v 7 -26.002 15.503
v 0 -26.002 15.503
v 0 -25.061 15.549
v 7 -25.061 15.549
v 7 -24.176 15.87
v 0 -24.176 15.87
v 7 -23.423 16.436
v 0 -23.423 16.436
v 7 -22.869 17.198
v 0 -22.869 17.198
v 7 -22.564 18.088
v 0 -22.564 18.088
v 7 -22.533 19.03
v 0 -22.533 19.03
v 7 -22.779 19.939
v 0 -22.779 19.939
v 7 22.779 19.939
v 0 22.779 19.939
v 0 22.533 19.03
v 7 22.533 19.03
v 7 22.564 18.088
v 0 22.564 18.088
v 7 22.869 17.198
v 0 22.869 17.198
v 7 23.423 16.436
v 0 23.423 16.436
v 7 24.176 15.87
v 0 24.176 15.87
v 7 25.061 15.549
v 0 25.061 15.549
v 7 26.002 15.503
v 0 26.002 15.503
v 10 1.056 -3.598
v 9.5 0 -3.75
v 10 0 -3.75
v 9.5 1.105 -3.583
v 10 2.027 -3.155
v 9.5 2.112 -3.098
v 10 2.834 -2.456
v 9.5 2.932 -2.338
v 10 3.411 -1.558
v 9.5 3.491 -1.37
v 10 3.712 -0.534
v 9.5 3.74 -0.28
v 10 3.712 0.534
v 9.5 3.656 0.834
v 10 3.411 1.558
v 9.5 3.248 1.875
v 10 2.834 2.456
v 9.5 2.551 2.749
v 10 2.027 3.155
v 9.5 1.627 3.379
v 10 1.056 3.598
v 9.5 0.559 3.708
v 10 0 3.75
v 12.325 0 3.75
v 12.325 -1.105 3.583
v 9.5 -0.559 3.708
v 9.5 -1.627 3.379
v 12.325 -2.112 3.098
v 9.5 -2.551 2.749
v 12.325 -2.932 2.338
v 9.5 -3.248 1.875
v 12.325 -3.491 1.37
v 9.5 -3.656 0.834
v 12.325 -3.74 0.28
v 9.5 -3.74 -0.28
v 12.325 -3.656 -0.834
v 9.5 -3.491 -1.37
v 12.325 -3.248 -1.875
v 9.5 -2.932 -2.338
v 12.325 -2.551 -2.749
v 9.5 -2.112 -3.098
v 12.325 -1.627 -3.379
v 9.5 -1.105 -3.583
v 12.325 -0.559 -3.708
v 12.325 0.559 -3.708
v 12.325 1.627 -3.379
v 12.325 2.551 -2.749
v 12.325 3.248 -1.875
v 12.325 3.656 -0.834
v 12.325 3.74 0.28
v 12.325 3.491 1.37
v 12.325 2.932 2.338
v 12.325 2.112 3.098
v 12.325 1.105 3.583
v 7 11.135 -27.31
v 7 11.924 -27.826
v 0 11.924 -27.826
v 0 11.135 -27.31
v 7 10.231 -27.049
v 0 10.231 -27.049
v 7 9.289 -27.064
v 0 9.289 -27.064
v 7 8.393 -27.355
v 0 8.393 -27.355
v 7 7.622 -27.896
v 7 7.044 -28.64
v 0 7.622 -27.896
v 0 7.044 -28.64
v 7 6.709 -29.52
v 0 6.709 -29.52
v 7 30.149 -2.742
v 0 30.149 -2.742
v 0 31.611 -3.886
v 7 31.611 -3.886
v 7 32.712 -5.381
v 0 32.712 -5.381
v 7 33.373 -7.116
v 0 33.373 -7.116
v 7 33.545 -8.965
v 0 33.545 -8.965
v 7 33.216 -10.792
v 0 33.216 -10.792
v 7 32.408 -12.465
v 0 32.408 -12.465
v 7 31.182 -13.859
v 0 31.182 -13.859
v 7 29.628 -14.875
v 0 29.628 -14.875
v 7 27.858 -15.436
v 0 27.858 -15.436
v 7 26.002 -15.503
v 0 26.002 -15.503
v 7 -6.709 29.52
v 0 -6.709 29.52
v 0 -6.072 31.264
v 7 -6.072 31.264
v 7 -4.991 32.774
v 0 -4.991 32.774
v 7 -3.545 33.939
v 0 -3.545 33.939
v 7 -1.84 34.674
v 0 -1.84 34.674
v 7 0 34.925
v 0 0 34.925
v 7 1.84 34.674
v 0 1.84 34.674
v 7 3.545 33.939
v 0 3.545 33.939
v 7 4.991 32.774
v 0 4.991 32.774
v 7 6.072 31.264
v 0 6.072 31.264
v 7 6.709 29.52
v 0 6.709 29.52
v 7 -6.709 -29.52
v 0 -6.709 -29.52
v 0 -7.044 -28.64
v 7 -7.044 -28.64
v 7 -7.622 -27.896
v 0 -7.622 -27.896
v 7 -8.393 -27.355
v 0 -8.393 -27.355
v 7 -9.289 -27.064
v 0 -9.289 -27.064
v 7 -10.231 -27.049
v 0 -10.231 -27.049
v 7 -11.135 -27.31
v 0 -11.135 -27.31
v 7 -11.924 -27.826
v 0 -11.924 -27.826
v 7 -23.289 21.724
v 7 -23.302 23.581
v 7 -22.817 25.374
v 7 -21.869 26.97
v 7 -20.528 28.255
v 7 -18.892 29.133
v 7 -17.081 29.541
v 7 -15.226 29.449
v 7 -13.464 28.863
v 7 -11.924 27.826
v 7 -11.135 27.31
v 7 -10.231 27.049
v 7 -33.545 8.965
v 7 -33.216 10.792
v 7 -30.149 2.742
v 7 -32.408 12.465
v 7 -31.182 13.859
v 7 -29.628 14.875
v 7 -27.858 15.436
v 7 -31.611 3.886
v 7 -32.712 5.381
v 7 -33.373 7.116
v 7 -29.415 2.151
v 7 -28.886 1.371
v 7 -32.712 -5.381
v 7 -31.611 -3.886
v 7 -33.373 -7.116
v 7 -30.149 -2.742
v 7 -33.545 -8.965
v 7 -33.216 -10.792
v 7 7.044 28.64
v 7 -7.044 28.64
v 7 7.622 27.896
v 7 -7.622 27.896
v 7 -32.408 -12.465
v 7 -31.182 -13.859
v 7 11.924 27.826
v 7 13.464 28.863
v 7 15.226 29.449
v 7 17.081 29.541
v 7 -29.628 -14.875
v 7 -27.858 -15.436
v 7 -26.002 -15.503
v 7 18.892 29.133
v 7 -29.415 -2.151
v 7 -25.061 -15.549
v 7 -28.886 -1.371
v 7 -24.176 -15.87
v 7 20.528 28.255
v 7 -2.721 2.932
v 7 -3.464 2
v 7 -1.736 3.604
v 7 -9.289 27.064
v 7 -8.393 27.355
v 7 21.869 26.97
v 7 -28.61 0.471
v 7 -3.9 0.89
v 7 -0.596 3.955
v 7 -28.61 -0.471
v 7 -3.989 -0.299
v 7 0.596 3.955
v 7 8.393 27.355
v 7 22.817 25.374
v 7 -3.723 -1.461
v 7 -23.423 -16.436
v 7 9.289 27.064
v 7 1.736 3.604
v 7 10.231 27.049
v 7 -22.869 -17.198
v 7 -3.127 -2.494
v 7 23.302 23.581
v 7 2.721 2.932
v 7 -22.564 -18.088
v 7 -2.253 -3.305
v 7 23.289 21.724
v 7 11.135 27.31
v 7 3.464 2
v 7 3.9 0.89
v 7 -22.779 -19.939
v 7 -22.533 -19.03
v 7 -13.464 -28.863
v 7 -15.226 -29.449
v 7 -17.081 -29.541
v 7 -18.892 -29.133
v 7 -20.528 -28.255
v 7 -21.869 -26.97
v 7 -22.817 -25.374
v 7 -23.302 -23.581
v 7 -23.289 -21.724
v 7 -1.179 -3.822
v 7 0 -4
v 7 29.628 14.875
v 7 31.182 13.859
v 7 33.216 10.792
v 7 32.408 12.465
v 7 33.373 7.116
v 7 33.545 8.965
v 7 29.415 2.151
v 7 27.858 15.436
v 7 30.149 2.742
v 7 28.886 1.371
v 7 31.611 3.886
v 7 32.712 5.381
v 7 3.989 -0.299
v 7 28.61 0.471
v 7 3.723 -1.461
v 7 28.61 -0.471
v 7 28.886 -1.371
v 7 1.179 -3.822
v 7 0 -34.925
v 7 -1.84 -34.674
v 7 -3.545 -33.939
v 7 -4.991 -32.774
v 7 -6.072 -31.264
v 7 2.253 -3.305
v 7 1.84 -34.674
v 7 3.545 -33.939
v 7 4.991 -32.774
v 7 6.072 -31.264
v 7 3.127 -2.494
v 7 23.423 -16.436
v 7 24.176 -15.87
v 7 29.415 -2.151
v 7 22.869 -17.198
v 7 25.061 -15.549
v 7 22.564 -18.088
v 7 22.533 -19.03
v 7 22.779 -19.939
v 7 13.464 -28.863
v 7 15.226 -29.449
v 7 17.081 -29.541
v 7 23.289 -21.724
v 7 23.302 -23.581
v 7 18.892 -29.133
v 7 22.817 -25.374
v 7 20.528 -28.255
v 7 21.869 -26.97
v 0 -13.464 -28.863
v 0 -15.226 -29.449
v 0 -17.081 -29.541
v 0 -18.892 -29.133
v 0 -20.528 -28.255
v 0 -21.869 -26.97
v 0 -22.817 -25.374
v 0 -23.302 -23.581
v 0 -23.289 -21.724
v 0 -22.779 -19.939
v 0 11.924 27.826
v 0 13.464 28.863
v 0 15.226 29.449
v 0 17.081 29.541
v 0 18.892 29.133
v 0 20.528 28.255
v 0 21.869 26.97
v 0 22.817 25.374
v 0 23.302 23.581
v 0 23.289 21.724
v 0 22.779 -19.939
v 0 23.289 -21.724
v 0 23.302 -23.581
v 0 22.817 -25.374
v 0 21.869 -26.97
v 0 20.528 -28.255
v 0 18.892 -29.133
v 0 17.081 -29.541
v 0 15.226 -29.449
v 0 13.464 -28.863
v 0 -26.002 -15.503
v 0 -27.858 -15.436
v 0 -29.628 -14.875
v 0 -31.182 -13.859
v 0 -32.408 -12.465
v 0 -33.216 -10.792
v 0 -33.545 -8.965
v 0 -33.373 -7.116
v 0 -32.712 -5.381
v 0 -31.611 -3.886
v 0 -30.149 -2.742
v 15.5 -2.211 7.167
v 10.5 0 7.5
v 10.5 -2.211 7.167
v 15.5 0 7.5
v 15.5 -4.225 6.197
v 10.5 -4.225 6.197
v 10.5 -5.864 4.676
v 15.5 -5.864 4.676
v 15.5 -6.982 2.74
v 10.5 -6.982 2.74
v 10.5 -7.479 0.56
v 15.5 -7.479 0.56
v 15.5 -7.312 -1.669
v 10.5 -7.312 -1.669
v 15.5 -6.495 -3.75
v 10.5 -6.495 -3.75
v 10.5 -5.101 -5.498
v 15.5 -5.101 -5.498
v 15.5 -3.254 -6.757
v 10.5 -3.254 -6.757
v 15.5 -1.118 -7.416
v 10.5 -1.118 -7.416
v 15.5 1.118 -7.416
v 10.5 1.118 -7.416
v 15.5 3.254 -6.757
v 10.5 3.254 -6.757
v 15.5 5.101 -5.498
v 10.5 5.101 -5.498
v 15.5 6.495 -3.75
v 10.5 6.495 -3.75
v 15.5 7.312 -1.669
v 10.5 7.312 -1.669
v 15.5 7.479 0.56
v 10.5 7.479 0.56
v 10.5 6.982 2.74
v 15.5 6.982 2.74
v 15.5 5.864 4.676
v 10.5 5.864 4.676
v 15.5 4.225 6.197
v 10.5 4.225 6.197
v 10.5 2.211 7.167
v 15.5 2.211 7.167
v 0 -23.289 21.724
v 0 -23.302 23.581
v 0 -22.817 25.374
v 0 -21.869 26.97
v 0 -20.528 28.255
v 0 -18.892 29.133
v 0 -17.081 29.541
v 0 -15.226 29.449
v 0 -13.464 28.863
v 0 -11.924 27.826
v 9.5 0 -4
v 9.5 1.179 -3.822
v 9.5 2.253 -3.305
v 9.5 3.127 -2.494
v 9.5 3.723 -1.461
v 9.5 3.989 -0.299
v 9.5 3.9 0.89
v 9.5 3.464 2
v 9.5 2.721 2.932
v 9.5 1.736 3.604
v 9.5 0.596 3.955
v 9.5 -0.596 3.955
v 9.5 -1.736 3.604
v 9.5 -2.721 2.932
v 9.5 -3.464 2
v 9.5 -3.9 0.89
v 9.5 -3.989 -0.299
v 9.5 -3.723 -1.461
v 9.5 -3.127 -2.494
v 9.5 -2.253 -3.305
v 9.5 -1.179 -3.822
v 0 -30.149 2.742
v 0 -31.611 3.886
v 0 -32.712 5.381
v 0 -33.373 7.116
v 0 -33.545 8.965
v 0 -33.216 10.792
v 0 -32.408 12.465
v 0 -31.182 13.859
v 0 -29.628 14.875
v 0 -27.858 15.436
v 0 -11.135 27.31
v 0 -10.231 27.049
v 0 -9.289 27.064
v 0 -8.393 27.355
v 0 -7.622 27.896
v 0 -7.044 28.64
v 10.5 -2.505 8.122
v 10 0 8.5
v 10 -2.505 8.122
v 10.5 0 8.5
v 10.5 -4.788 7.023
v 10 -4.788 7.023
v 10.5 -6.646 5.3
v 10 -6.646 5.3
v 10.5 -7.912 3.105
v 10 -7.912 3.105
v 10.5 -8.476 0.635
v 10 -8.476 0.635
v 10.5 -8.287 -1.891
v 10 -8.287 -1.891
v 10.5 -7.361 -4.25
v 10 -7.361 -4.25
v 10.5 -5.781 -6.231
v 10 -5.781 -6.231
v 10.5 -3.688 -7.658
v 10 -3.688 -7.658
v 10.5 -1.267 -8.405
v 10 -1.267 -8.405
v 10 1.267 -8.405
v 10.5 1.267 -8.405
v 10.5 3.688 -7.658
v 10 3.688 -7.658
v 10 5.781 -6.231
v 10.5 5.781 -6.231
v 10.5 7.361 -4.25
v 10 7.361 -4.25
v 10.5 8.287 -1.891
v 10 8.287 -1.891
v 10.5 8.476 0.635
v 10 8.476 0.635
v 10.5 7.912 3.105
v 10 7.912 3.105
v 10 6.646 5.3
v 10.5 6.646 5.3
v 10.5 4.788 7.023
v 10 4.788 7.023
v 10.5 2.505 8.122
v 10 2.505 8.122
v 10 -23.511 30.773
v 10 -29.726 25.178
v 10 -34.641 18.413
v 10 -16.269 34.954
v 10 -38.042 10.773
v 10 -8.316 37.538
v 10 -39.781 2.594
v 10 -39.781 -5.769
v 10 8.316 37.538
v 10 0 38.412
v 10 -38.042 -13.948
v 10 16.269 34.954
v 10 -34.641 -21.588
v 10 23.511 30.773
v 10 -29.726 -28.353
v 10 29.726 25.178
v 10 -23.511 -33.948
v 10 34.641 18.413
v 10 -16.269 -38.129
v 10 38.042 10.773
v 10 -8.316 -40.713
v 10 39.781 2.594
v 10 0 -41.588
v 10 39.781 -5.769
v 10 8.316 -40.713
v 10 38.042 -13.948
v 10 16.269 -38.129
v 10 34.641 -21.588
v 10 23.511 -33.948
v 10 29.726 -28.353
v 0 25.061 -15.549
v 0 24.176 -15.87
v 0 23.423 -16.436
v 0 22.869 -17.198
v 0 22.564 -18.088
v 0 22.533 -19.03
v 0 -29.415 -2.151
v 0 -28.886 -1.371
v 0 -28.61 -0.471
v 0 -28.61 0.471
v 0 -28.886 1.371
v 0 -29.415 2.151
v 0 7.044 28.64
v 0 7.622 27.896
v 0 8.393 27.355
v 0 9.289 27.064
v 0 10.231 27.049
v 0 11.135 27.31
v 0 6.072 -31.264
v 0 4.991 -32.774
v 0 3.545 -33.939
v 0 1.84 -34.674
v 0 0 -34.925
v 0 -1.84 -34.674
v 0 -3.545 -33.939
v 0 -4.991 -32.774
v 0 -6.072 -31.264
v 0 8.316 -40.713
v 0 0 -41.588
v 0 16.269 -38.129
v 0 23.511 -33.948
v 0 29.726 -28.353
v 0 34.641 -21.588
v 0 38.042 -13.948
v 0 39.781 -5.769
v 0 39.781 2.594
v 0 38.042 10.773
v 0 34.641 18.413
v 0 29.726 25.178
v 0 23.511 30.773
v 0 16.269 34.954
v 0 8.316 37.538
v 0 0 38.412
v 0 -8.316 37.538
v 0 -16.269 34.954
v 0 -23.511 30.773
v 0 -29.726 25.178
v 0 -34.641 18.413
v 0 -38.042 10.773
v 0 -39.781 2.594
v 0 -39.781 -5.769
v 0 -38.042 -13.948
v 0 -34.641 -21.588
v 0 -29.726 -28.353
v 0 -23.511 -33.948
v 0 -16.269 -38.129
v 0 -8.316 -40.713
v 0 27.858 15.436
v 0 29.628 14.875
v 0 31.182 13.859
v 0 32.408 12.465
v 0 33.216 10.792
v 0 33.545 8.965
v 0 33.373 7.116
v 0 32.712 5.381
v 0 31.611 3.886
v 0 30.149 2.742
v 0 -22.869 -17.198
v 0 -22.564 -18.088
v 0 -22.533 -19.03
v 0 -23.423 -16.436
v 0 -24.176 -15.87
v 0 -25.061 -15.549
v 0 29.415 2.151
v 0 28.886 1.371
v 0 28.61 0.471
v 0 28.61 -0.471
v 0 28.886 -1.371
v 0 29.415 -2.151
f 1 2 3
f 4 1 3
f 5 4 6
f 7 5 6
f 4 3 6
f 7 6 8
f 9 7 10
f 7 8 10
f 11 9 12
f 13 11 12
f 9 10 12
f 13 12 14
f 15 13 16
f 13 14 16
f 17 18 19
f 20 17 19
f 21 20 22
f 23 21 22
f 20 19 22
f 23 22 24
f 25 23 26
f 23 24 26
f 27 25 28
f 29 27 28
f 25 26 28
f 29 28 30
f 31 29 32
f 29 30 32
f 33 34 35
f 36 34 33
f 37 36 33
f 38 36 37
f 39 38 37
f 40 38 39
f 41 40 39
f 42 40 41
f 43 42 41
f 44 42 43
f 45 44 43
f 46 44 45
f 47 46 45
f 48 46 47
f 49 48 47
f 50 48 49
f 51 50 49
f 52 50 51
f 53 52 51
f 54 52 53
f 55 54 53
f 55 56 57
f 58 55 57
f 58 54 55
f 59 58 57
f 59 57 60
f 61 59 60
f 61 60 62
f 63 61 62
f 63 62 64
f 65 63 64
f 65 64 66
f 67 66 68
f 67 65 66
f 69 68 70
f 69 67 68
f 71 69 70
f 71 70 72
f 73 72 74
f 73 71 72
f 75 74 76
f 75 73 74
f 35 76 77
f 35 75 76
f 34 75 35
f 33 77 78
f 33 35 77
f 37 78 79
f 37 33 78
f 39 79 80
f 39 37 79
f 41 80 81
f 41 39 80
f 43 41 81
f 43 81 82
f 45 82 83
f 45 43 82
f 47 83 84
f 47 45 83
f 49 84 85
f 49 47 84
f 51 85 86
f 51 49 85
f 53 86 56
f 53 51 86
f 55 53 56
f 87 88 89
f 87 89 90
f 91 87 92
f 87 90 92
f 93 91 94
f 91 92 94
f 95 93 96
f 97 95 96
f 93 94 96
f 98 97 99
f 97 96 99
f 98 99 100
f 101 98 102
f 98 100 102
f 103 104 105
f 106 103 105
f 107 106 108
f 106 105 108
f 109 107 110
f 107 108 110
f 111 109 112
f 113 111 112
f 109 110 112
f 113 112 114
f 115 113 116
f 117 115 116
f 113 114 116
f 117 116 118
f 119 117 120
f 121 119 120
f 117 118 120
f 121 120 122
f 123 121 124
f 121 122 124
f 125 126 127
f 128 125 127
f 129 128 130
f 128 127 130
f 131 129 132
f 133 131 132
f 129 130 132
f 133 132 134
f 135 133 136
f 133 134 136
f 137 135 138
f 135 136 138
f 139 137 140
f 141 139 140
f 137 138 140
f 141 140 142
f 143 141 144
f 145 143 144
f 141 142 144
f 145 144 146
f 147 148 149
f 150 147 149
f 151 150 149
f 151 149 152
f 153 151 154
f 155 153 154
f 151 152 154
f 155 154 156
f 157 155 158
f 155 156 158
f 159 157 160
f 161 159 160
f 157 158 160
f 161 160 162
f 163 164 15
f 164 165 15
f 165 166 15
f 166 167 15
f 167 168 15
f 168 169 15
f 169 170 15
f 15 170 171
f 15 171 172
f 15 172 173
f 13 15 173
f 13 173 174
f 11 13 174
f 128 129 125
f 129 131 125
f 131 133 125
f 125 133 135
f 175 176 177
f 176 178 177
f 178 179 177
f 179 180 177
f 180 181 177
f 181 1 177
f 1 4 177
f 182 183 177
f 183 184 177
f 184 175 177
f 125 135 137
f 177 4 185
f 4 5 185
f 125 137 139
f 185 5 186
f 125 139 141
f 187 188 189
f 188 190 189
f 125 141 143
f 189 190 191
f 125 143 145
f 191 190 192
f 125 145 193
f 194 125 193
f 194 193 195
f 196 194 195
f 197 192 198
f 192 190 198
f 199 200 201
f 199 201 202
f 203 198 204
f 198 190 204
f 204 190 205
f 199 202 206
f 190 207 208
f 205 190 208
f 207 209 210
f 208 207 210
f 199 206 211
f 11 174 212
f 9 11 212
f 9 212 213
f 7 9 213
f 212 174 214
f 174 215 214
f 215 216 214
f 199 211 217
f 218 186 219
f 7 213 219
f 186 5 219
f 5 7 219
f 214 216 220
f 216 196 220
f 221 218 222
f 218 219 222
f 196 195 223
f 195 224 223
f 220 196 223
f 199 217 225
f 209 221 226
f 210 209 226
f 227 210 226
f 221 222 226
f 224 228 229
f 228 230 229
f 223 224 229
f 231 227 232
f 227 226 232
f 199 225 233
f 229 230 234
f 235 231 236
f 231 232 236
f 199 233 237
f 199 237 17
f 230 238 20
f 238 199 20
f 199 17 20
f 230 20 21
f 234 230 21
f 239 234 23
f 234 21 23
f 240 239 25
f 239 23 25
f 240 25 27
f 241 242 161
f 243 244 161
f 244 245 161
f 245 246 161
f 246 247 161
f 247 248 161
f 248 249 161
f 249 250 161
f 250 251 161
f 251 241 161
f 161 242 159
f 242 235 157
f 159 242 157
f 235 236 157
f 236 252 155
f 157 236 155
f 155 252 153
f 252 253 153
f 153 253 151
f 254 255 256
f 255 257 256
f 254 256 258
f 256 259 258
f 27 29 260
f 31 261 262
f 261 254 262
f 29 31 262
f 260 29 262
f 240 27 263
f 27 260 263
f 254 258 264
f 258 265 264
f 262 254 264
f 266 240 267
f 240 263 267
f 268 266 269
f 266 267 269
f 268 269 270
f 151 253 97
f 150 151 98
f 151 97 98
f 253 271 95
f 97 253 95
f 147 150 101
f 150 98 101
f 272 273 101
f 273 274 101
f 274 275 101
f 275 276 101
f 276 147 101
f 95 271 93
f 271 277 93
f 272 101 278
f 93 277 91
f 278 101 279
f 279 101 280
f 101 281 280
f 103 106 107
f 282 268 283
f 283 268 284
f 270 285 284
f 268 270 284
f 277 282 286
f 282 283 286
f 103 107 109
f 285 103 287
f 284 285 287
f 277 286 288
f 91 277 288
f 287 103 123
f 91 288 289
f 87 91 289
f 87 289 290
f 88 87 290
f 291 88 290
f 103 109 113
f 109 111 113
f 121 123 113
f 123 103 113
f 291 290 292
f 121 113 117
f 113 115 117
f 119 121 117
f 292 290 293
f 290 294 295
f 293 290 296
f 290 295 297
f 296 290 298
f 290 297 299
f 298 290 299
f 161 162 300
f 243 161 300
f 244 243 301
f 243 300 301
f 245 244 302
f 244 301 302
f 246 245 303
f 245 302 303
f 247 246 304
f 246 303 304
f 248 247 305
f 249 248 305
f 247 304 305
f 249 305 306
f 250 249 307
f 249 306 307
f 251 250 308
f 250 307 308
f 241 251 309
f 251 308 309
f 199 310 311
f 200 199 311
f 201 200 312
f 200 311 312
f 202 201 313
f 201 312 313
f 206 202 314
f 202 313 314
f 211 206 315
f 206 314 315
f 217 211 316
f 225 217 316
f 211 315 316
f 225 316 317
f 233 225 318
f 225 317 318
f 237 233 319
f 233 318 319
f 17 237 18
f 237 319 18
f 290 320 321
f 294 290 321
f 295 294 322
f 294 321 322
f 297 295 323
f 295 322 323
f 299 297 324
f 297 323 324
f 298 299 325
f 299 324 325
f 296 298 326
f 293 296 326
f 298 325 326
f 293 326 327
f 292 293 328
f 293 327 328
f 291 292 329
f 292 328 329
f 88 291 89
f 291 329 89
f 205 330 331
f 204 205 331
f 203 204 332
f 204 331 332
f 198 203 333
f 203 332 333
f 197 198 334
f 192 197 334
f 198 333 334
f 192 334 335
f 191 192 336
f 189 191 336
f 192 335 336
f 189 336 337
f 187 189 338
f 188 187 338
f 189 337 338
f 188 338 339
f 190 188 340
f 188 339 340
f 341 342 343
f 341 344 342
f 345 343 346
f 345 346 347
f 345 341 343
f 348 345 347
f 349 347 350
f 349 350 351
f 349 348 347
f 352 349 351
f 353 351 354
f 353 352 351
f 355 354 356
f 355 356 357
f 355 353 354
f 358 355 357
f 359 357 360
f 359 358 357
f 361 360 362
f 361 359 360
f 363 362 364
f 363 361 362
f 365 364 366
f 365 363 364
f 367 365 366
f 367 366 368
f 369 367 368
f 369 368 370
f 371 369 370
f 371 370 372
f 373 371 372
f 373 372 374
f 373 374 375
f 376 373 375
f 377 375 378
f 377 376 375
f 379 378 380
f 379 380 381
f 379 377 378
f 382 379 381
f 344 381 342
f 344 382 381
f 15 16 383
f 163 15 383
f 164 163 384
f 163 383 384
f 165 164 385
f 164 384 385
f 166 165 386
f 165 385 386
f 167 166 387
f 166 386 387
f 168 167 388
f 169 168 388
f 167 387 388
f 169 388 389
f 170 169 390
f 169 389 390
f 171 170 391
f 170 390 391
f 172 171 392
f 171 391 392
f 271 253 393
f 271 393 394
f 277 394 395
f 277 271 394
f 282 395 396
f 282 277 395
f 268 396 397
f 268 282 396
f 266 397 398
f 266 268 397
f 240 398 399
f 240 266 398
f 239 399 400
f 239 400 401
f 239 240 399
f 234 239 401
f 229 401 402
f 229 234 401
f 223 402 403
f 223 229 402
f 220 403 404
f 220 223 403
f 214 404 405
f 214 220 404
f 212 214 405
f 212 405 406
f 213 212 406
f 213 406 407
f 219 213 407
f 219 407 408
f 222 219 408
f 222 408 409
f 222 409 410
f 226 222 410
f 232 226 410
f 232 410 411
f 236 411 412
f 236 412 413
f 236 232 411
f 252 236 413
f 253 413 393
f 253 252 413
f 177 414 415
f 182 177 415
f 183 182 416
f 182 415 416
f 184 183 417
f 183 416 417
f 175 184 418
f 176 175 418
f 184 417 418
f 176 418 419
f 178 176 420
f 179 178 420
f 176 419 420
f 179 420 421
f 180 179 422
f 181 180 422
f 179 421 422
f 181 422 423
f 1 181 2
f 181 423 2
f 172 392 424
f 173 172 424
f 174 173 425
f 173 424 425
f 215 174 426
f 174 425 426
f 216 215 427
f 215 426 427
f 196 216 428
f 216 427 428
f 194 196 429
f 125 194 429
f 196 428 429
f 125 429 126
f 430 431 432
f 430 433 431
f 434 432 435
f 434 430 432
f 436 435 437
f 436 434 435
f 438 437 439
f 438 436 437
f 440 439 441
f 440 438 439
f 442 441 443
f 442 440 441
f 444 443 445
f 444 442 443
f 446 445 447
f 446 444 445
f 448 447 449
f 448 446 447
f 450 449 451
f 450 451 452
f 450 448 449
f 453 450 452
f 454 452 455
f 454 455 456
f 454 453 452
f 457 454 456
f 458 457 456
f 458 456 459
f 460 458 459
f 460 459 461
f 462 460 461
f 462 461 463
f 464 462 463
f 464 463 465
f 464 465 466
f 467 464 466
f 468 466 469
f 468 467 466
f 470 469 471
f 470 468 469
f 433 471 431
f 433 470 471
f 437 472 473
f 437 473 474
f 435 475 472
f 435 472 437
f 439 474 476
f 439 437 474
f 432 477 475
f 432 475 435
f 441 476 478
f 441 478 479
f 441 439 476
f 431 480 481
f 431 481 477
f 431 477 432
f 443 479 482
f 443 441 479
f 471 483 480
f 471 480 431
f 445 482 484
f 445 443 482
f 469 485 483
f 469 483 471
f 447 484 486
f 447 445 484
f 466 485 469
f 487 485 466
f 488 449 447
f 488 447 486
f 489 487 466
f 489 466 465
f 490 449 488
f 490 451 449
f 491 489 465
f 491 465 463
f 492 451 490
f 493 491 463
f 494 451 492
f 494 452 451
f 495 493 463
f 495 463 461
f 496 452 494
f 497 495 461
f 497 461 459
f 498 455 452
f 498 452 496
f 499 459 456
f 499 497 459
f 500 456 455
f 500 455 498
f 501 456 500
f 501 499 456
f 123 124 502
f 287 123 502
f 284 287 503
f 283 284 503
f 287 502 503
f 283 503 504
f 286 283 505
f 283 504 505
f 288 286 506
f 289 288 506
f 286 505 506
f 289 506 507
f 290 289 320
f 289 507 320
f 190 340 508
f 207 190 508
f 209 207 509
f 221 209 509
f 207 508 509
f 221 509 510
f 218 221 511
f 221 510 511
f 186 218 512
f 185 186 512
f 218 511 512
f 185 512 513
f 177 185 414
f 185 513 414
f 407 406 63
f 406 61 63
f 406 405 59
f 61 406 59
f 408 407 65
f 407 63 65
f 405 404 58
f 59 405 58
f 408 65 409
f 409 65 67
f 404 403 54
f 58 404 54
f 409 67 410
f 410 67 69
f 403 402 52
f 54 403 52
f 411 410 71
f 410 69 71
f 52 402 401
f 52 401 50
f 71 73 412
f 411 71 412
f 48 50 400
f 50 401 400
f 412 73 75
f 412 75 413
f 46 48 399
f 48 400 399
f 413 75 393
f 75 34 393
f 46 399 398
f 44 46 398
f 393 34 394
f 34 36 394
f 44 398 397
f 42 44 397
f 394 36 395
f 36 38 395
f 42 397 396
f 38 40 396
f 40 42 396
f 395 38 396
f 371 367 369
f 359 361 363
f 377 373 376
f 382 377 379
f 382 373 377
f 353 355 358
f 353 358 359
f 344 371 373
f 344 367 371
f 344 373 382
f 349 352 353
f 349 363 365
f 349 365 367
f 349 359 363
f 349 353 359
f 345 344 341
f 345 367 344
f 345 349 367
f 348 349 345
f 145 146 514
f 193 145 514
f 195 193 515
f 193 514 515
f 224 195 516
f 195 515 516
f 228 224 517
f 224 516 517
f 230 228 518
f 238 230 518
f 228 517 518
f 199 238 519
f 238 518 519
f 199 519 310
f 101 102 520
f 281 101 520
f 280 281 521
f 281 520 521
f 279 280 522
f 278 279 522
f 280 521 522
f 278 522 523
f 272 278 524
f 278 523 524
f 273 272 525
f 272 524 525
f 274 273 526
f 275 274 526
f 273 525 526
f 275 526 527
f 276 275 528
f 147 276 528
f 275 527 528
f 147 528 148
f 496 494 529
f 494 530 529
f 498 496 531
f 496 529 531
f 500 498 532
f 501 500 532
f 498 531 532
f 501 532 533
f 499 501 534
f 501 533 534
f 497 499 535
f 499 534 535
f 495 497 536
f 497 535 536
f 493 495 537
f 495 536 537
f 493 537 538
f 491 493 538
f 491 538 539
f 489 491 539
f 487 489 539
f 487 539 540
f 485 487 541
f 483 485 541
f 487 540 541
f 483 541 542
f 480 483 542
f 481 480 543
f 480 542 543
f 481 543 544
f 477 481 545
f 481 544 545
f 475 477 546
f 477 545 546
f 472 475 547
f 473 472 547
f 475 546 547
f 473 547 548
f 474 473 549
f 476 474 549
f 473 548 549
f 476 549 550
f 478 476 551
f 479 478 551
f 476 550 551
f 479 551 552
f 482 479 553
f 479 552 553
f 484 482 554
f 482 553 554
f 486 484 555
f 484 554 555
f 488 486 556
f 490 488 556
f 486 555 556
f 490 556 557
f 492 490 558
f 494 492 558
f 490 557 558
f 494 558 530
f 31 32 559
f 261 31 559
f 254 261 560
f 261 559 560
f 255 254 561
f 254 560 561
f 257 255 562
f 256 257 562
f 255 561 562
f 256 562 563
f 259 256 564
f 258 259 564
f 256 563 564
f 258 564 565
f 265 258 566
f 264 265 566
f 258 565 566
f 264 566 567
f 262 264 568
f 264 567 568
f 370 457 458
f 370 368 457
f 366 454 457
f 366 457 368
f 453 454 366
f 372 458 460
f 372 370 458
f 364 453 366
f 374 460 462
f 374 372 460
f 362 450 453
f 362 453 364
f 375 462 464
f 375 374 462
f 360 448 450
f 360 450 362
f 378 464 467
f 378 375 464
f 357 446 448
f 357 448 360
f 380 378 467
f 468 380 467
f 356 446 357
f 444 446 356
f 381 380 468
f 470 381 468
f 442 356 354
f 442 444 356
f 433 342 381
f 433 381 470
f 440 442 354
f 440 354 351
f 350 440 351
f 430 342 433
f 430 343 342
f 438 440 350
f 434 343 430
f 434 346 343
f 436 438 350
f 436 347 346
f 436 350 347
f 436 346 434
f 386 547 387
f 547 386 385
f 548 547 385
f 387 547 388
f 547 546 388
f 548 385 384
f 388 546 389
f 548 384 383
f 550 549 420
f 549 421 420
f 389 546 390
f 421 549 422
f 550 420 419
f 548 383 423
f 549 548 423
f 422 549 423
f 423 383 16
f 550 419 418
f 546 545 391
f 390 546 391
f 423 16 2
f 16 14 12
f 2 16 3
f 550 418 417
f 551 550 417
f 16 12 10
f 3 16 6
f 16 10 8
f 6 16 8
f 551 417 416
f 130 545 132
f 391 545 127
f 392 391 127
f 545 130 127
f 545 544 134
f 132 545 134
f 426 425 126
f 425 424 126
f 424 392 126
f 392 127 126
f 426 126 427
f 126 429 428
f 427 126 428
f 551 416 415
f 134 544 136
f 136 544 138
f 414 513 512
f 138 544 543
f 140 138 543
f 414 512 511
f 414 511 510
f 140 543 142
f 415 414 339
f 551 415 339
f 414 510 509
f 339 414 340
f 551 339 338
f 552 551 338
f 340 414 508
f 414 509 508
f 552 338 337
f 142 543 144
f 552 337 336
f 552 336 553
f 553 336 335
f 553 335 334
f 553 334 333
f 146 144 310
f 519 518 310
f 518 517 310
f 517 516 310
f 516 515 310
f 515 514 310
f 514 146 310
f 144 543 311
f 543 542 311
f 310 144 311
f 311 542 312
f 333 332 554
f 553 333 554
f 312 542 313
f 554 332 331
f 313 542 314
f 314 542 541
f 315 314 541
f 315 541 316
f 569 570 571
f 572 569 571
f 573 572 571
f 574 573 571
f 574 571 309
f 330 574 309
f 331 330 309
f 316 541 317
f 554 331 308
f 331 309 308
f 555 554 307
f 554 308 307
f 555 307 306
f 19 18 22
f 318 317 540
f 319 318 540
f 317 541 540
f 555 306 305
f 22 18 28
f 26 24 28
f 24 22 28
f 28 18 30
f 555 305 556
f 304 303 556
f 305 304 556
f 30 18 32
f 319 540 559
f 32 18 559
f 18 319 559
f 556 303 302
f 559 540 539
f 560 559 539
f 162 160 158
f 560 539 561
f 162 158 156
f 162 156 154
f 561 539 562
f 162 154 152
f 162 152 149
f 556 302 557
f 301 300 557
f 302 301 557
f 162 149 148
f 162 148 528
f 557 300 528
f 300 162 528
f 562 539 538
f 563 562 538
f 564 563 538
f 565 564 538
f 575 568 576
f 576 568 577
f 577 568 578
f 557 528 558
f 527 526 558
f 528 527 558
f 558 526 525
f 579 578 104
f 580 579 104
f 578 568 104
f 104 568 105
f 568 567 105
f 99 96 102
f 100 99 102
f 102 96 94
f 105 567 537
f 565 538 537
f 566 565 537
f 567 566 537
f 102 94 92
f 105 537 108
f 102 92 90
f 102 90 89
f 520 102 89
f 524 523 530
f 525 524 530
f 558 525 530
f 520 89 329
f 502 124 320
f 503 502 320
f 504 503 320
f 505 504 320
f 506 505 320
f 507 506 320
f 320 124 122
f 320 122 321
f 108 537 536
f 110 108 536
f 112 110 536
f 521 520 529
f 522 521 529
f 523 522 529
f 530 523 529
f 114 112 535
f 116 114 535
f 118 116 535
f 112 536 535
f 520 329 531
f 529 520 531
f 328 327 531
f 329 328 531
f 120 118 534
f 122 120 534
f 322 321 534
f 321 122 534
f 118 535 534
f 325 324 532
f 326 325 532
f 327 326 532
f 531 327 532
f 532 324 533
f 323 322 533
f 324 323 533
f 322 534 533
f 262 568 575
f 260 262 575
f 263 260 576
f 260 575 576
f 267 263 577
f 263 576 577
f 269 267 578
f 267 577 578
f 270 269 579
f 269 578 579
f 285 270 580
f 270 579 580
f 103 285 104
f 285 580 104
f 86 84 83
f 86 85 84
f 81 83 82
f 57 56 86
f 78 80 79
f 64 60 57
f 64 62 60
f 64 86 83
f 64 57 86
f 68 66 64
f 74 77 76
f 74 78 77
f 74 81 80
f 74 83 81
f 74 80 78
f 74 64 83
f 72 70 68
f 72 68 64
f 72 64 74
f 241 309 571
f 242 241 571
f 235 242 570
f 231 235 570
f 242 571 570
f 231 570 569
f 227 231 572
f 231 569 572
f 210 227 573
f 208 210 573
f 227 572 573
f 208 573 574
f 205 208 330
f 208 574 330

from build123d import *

# Parameters (mm, degrees)
SKETCH1_R           = 40
SKETCH1_R_2         = 3.175
BOSS_EXTRUDE1_DEPTH = 7
SKETCH2_R           = 40
SKETCH2_R_2         = 4
BOSS_EXTRUDE2_DEPTH = 2.5
SKETCH3_R           = 40
SKETCH3_R_2         = 4
SKETCH3_R_3         = 3.75
BOSS_EXTRUDE3_DEPTH = 0.5


with BuildPart() as part:
    # Sketch1 → Boss-Extrude1 (new body)
    # profile 1 of 11: a face of its own
    with BuildSketch(Plane(origin=(0, 0, 0), x_dir=(0, 0, -1), z_dir=(1, 0, 0))):
        with Locations((1.5875, 0)):
            Circle(SKETCH1_R)
        with BuildLine():
            ThreePointArc((-2.741552048, 30.148588945), (-0.829517102, 34.814722887), (3.175, 31.75))
            ThreePointArc((3.175, 31.75), (3.064722887, 30.920482898), (2.741552048, 30.148588945))
            ThreePointArc((2.741552048, 30.148588945), (10.792418529, 33.215648832), (15.502933761, 26.002164676))
            ThreePointArc((15.502933761, 26.002164676), (18.82031557, 28.857349126), (21.83718176, 25.686289571))
            ThreePointArc((21.83718176, 25.686289571), (21.320571551, 23.95032047), (19.938858158, 22.779276951))
            ThreePointArc((19.938858158, 22.779276951), (28.254918529, 20.528399936), (27.8258258, 11.923797281))
            ThreePointArc((27.8258258, 11.923797281), (31.326349875, 12.77828039), (33.371044392, 9.811289571))
            ThreePointArc((33.371044392, 9.811289571), (32.187879372, 7.338797223), (29.520198147, 6.7090554))
            ThreePointArc((29.520198147, 6.7090554), (34.925, 0), (29.520198147, -6.7090554))
            ThreePointArc((29.520198147, -6.7090554), (32.187879372, -7.338797223), (33.371044392, -9.811289571))
            ThreePointArc((33.371044392, -9.811289571), (31.326349875, -12.77828039), (27.8258258, -11.923797281))
            ThreePointArc((27.8258258, -11.923797281), (28.254918529, -20.528399936), (19.938858158, -22.779276951))
            ThreePointArc((19.938858158, -22.779276951), (21.320571551, -23.95032047), (21.83718176, -25.686289571))
            ThreePointArc((21.83718176, -25.686289571), (18.82031557, -28.857349126), (15.502933761, -26.002164676))
            ThreePointArc((15.502933761, -26.002164676), (10.792418529, -33.215648832), (2.741552048, -30.148588945))
            ThreePointArc((2.741552048, -30.148588945), (3.064722887, -30.920482898), (3.175, -31.75))
            ThreePointArc((3.175, -31.75), (-0.829517102, -34.814722887), (-2.741552048, -30.148588945))
            ThreePointArc((-2.741552048, -30.148588945), (-10.792418529, -33.215648832), (-15.502933761, -26.002164676))
            ThreePointArc((-15.502933761, -26.002164676), (-20.528399936, -28.254918529), (-19.938858158, -22.779276951))
            ThreePointArc((-19.938858158, -22.779276951), (-28.254918529, -20.528399936), (-27.8258258, -11.923797281))
            ThreePointArc((-27.8258258, -11.923797281), (-33.215648832, -10.792418529), (-29.520198147, -6.7090554))
            ThreePointArc((-29.520198147, -6.7090554), (-34.925, 0), (-29.520198147, 6.7090554))
            ThreePointArc((-29.520198147, 6.7090554), (-33.215648832, 10.792418529), (-27.8258258, 11.923797281))
            ThreePointArc((-27.8258258, 11.923797281), (-28.254918529, 20.528399936), (-19.938858158, 22.779276951))
            ThreePointArc((-19.938858158, 22.779276951), (-20.528399936, 28.254918529), (-15.502933761, 26.002164676))
            ThreePointArc((-15.502933761, 26.002164676), (-10.792418529, 33.215648832), (-2.741552048, 30.148588945))
        make_face(mode=Mode.SUBTRACT)
    # profile 2 of 11: a face of its own
    with BuildSketch(Plane(origin=(0, 0, 0), x_dir=(0, 0, -1), z_dir=(1, 0, 0))):
        with Locations((18.66218176, 25.686289571)):
            Circle(SKETCH1_R_2)
    # profile 3 of 11: a face of its own
    with BuildSketch(Plane(origin=(0, 0, 0), x_dir=(0, 0, -1), z_dir=(1, 0, 0))):
        with Locations((30.196044392, 9.811289571)):
            Circle(SKETCH1_R_2)
    # profile 4 of 11: a face of its own
    with BuildSketch(Plane(origin=(0, 0, 0), x_dir=(0, 0, -1), z_dir=(1, 0, 0))):
        with Locations((30.196044392, -9.811289571)):
            Circle(SKETCH1_R_2)
    # profile 5 of 11: a face of its own
    with BuildSketch(Plane(origin=(0, 0, 0), x_dir=(0, 0, -1), z_dir=(1, 0, 0))):
        with Locations((18.66218176, -25.686289571)):
            Circle(SKETCH1_R_2)
    # profile 6 of 11: a face of its own
    with BuildSketch(Plane(origin=(0, 0, 0), x_dir=(0, 0, -1), z_dir=(1, 0, 0))):
        with Locations((0, -31.75)):
            Circle(SKETCH1_R_2)
    # profile 7 of 11: a face of its own
    with BuildSketch(Plane(origin=(0, 0, 0), x_dir=(0, 0, -1), z_dir=(1, 0, 0))):
        with Locations((-18.66218176, -25.686289571)):
            Circle(SKETCH1_R_2)
    # profile 8 of 11: a face of its own
    with BuildSketch(Plane(origin=(0, 0, 0), x_dir=(0, 0, -1), z_dir=(1, 0, 0))):
        with Locations((-30.196044392, -9.811289571)):
            Circle(SKETCH1_R_2)
    # profile 9 of 11: a face of its own
    with BuildSketch(Plane(origin=(0, 0, 0), x_dir=(0, 0, -1), z_dir=(1, 0, 0))):
        with Locations((-30.196044392, 9.811289571)):
            Circle(SKETCH1_R_2)
    # profile 10 of 11: a face of its own
    with BuildSketch(Plane(origin=(0, 0, 0), x_dir=(0, 0, -1), z_dir=(1, 0, 0))):
        with Locations((-18.66218176, 25.686289571)):
            Circle(SKETCH1_R_2)
    # profile 11 of 11: a face of its own
    with BuildSketch(Plane(origin=(0, 0, 0), x_dir=(0, 0, -1), z_dir=(1, 0, 0))):
        with Locations((0, 31.75)):
            Circle(SKETCH1_R_2)
    extrude(amount=BOSS_EXTRUDE1_DEPTH)

    # Sketch2 → Boss-Extrude2 (add)
    with BuildSketch(Plane(origin=(7, 0, 0), x_dir=(0, 0, -1), z_dir=(1, 0, 0))):
        with Locations((1.5875, 0)):
            Circle(SKETCH2_R)
        Circle(SKETCH2_R_2, mode=Mode.SUBTRACT)
    extrude(amount=BOSS_EXTRUDE2_DEPTH)

    # Sketch3 → Boss-Extrude3 (add)
    # profile 1 of 2: a face of its own
    with BuildSketch(Plane(origin=(9.5, 0, 0), x_dir=(0, 0, -1), z_dir=(1, 0, 0))):
        with Locations((1.5875, 0)):
            Circle(SKETCH3_R)
        Circle(SKETCH3_R_2, mode=Mode.SUBTRACT)
    # profile 2 of 2: a face of its own
    with BuildSketch(Plane(origin=(9.5, 0, 0), x_dir=(0, 0, -1), z_dir=(1, 0, 0))):
        Circle(SKETCH3_R_2)
        Circle(SKETCH3_R_3, mode=Mode.SUBTRACT)
    extrude(amount=BOSS_EXTRUDE3_DEPTH)

    # Sketch4 → Revolve1 (revolve)
    with BuildSketch(Plane.XY, mode=Mode.PRIVATE) as revolve1_sk:
        Polygon((10, 8.5), (10.5, 8.5), (10.5, 7.5), (15.5, 7.5), (15.5, 0), (12.325, 0), (12.325, 3.75), (10, 3.75), align=None)
    revolve(revolve1_sk.sketch.rotate(Axis((12.325, 0, 0), (1, 0, 0)), 90), axis=Axis((12.325, 0, 0), (1, 0, 0)))


solid = part.part
